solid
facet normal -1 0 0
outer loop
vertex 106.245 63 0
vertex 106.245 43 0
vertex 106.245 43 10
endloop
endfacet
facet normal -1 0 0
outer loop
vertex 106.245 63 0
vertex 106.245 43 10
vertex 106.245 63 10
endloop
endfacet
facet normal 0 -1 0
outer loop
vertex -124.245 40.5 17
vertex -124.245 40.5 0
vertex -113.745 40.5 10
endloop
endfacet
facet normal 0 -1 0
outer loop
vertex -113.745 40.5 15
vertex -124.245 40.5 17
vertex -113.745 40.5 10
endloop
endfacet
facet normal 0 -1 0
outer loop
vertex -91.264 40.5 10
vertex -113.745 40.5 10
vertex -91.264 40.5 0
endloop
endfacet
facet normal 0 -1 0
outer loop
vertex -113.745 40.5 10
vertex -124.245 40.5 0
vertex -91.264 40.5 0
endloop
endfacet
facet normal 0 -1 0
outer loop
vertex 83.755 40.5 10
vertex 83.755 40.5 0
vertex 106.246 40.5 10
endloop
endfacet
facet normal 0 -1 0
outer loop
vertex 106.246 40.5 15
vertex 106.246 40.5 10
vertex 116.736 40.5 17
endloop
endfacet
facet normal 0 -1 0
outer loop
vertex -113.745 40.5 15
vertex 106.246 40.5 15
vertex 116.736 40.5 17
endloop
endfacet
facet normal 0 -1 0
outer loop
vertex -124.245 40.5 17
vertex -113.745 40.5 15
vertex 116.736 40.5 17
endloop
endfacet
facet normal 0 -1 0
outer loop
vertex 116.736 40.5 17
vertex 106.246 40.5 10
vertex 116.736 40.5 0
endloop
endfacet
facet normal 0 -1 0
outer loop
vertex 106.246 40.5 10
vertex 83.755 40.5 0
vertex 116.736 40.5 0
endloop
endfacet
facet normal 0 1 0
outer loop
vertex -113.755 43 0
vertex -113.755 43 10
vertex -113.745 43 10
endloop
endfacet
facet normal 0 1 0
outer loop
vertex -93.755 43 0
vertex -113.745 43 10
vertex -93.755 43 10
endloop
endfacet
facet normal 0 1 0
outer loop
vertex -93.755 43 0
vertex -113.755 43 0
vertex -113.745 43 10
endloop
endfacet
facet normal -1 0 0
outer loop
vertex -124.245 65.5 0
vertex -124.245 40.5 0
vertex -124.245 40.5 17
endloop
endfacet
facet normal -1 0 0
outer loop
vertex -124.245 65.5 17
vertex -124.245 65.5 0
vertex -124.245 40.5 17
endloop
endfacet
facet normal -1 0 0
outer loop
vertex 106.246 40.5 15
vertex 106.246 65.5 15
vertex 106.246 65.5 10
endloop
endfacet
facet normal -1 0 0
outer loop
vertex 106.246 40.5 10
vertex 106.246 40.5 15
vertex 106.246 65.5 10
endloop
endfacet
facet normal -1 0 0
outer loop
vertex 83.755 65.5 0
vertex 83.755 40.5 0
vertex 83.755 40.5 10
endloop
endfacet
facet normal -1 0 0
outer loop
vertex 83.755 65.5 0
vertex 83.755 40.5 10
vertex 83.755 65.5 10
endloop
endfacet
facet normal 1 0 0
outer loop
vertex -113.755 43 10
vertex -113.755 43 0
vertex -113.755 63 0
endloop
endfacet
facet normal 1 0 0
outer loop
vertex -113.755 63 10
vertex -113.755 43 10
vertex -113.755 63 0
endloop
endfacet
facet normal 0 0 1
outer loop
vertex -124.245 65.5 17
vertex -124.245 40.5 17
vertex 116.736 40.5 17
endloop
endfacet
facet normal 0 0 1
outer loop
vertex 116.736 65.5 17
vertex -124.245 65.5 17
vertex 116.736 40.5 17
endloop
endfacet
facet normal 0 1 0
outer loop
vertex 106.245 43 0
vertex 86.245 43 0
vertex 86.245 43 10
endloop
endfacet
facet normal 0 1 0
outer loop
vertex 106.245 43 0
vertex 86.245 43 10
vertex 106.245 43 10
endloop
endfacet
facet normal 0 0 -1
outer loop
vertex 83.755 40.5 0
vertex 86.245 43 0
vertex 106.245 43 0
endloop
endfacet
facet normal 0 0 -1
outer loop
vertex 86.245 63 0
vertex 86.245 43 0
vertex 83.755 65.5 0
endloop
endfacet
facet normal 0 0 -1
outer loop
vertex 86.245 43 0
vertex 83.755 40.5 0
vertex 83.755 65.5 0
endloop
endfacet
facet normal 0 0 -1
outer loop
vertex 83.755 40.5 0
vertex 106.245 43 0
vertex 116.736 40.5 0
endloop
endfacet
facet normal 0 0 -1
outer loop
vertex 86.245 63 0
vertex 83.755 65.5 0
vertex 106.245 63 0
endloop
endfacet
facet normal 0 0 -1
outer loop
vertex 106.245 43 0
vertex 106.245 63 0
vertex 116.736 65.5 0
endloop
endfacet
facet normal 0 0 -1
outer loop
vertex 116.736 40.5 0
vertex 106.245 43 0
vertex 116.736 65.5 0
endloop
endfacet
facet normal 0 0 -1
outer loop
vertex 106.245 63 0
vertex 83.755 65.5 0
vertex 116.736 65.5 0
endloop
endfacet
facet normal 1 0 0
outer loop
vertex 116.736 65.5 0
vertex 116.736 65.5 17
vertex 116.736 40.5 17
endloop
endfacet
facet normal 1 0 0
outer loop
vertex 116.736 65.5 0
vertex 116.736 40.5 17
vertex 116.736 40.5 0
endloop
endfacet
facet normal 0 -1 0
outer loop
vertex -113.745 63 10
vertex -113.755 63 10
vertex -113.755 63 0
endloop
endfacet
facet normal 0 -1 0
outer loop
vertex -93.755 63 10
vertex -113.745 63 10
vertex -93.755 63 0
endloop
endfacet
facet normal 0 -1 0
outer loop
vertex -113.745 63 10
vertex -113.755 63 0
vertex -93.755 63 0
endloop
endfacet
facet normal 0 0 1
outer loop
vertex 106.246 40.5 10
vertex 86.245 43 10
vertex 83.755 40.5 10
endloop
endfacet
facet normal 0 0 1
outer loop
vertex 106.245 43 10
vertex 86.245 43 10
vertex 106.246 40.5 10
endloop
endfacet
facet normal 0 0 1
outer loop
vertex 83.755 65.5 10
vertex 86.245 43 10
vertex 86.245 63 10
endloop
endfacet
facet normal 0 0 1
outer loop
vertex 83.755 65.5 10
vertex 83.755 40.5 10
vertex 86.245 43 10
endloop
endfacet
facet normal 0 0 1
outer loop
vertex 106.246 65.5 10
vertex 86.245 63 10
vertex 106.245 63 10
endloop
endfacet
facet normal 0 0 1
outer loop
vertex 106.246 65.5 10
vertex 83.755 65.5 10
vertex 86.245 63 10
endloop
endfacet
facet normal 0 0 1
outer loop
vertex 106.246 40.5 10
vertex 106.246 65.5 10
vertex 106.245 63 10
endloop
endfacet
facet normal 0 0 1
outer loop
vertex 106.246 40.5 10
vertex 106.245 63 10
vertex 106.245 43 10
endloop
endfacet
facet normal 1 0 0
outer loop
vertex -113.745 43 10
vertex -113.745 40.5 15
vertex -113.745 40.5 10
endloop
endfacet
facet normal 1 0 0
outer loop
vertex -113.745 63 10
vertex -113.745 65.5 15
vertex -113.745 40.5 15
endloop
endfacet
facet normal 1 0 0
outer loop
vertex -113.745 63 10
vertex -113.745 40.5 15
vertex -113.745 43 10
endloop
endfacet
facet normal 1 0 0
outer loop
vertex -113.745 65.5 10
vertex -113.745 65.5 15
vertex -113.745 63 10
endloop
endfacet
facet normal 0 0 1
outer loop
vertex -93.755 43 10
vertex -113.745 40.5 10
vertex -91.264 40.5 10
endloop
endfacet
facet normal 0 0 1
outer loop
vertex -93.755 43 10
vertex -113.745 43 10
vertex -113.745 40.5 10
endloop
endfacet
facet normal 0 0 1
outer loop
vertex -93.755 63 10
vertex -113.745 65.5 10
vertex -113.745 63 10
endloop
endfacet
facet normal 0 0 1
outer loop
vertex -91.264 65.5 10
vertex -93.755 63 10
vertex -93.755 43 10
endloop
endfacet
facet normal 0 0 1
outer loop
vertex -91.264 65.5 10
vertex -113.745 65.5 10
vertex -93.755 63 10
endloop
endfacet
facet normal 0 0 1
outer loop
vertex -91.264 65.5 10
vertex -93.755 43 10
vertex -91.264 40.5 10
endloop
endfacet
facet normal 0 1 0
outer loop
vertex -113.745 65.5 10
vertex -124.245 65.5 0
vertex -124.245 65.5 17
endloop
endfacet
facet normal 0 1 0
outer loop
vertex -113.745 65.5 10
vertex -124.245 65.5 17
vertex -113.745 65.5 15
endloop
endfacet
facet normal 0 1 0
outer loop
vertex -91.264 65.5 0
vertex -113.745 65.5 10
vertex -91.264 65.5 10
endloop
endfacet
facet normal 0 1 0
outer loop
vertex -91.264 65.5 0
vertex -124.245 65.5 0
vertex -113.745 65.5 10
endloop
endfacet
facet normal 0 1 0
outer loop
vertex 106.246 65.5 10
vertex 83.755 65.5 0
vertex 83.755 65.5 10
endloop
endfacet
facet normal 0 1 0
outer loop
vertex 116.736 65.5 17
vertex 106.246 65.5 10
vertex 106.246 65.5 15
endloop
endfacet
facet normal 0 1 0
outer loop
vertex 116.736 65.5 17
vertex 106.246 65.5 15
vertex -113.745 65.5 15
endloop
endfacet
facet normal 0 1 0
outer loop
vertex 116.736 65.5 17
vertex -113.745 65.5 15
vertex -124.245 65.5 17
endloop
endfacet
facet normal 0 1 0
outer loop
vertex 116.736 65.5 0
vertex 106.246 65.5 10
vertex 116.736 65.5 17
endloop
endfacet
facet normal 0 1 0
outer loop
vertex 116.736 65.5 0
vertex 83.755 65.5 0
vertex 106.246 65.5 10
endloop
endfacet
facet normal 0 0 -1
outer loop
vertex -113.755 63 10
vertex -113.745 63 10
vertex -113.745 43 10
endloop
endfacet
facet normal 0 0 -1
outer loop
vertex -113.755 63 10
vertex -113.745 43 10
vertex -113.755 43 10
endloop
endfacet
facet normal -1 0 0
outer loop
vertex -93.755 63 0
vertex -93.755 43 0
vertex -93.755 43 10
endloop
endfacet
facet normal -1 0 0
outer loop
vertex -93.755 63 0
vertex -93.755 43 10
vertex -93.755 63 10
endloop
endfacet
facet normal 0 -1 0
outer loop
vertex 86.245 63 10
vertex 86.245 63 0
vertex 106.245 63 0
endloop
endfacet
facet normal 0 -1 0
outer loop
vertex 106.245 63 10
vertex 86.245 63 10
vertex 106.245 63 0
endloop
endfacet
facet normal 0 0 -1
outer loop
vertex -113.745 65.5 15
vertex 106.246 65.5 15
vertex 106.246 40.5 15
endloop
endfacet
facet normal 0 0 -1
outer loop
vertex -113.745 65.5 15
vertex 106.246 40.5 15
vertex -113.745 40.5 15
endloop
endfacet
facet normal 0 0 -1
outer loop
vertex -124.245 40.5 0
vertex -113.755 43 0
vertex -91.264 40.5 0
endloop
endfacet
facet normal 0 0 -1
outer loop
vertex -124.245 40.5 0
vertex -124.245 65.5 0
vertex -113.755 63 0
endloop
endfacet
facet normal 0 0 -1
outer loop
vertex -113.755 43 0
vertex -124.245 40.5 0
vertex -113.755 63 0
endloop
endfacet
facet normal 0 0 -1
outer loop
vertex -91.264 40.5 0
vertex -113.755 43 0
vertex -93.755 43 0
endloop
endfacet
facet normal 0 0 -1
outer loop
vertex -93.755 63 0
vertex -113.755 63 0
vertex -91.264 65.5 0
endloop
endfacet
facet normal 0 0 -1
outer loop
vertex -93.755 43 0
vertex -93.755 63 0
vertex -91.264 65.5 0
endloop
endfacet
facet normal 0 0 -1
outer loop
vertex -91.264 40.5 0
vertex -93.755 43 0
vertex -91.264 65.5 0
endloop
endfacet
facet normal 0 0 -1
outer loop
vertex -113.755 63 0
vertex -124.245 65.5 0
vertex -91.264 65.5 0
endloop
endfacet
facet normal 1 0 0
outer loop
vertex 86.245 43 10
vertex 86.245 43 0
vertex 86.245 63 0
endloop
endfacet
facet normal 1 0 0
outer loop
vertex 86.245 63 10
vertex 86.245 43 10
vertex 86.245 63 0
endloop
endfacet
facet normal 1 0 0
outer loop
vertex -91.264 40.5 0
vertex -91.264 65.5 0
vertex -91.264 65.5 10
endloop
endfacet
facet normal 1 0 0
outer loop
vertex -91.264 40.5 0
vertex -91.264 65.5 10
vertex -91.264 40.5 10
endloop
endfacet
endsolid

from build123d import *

# Parameters (mm, degrees)
ESQUISSE1_W                     = 20
ESQUISSE1_H                     = 20
BOSS_EXTRU_1_DEPTH              = 10
ESQUISSE2_W                     = 237.218260139
ESQUISSE2_H                     = 128.428413156
ENL_V_MAT_EXTRU_6_DEPTH         = 10
ENL_V_MAT_EXTRU_7_DEPTH         = 10
BOSS_EXTRU_4_START              = -2
BOSS_EXTRU_4_DEPTH              = 9
ESQUISSE10_W                    = 2
ESQUISSE10_H                    = 4
BOSS_EXTRU_5_DEPTH              = 224.980719072
ESQUISSE11_W                    = 2.5
ESQUISSE11_H                    = 5
BOSS_EXTRU_6_DEPTH              = 4
SYM_TRIE1_START                 = 8
SYM_TRIE1_OUTLINE_W             = 4
SYM_TRIE1_OUTLINE_H             = 4
SYM_TRIE1_DEPTH                 = 9
BOSS_EXTRU_9_REACH              = 128.238
BOSS_EXTRU_9_DIRECTION_2_REACH  = 128.238
BOSS_EXTRU_10_REACH             = 128.238
BOSS_EXTRU_10_DIRECTION_2_REACH = 128.238
ESQUISSE14_W                    = 8
ESQUISSE14_H                    = 8
BOSS_EXTRU_11_DEPTH             = 25


# Read off the part's stored shape, not the designer's step: Symétrie1
with BuildPart() as part:
    # Esquisse1 → Boss.-Extru.1 (new body)
    with BuildSketch(Plane.XY):
        Polygon((-116.245179768, 65.5), (-116.245179768, 40.5), (-116.189357624, -40.5), (-116.189357624, -65.5), (108.67971716, -65.5), (108.67971716, -40.5), (108.735539304, 40.5), (108.735539304, 65.5), align=None)
        Polygon((83.754820232, 40.5), (106.172004788, 40.5), (106.172004788, -40.5), (83.67971716, -40.5), (83.67971716, -63), (-91.189357624, -63), (-91.189357624, -40.5), (-113.681645253, -40.5), (-113.681645253, 40.5), (-91.264460696, 40.5), (-91.264460696, 63), (83.754820232, 63), align=None, mode=Mode.SUBTRACT)
        Polygon((-113.66622051, -63.007706414), (-113.681645253, -43.007712371), (-93.681645253, -43.023131157), (-93.697069995, -62.992287629), align=None, mode=Mode.SUBTRACT)
        Polygon((106.172004788, -43.007712371), (106.156580046, -63.007706414), (86.187429531, -62.992287629), (86.172004788, -43.023131157), align=None, mode=Mode.SUBTRACT)
        with Locations((-103.754820232, 53)):
            Rectangle(ESQUISSE1_W, ESQUISSE1_H, mode=Mode.SUBTRACT)
        with Locations((96.245179768, 53)):
            Rectangle(ESQUISSE1_W, ESQUISSE1_H, mode=Mode.SUBTRACT)
    extrude(amount=BOSS_EXTRU_1_DEPTH)

    # Esquisse2 → Enlèv. mat.-Extru.6 (cut)
    with BuildSketch(Plane(origin=(0, 0, 0), x_dir=(-1, 0, 0), z_dir=(0, 0, -1))):
        with Locations((9.873590765, -23.714206578)):
            Rectangle(ESQUISSE2_W, ESQUISSE2_H)
    extrude(amount=-ENL_V_MAT_EXTRU_6_DEPTH, mode=Mode.SUBTRACT)

    # Esquisse4 → Enlèv. mat.-Extru.7 (cut)
    with BuildSketch(Plane(origin=(0, 0, 0), x_dir=(-1, 0, 0), z_dir=(0, 0, -1))):
        Polygon((-83.754820232, 63), (-83.754820232, 68.626436571), (91.264460696, 65.5), (91.264460696, 63), align=None)
    extrude(amount=-ENL_V_MAT_EXTRU_7_DEPTH, mode=Mode.SUBTRACT)


with BuildPart() as enl_v_mat_extru_7_piece_1:
    # of the separate pieces the step leaves, piece 1, a body of its own (enl_v_mat_extru_7_pieces)
    add(part.part.solids().sort_by_distance((-116.245179768, 65.5, 0))[0])

    # Esquisse9 → Boss.-Extru.4 (add)
    with BuildSketch(Plane.XY.offset(10).offset(BOSS_EXTRU_4_START)):
        Polygon((-116.245179768, 53), (-116.245179768, 55), (-120.245179768, 55), (-120.245179768, 51), (-116.245179768, 51), align=None)
    extrude(amount=BOSS_EXTRU_4_DEPTH)

    # Esquisse10 → Boss.-Extru.5 (add)
    with BuildSketch(Plane(origin=(-116.245179768, 0, 0), x_dir=(0, 0, -1), z_dir=(1, 0, 0))):
        with Locations((-16, 53)):
            Rectangle(ESQUISSE10_W, ESQUISSE10_H)
    extrude(amount=BOSS_EXTRU_5_DEPTH)

    # Esquisse11 → Boss.-Extru.6 (add)
    with BuildSketch(Plane.XZ.offset(-51)):
        with Locations((-114.995179768, 12.5)):
            Rectangle(ESQUISSE11_W, ESQUISSE11_H)
    extrude(amount=-BOSS_EXTRU_6_DEPTH)

    # Symétrie1 outline → Symétrie1 (add)
    with BuildSketch(Plane.XY.offset(SYM_TRIE1_START)):
        with Locations((-122.245179768, 53)):
            Rectangle(SYM_TRIE1_OUTLINE_W, SYM_TRIE1_OUTLINE_H)
    extrude(amount=SYM_TRIE1_DEPTH)


with BuildPart() as enl_v_mat_extru_7_piece_2:
    # of the separate pieces the step leaves, piece 2, a body of its own (enl_v_mat_extru_7_pieces)
    add(part.part.solids().sort_by_distance((108.735539304, 65.5, 0))[0])

    # Boss.-Extru.9: up to this face of the body (flat: up to its plane)
    boss_extru_9_end = Plane(enl_v_mat_extru_7_piece_2.part.faces().sort_by_distance((96.245179768, 65.5, 5))[0])
    # Esquisse12 → Boss.-Extru.9 (add, up to the picked face)
    with BuildSketch(Plane(origin=(0, 55, 0), x_dir=(1, 0, 0), z_dir=(0, 1, 0)), mode=Mode.PRIVATE) as boss_extru_9_sk1:
        Polygon((108.735539304, -10), (108.735539304, -8), (116.735539304, -8), (116.735539304, -17), (108.735539304, -17), (108.735539304, -15), (106.245539304, -15), (106.245539304, -10), align=None)
    boss_extru_9_tool1 = split(extrude(boss_extru_9_sk1.sketch, amount=BOSS_EXTRU_9_REACH, mode=Mode.PRIVATE), bisect_by=boss_extru_9_end, keep=Keep.BOTH, mode=Mode.PRIVATE)

    add(enl_v_mat_extru_7_piece_1.part)  # Boss.-Extru.9 merges Enlèv. mat.-Extru.7 piece 1
    add(boss_extru_9_tool1.solids().sort_by(Axis((111.962298, 55, 12.5), (0, 1, 0)))[0])

    # Boss.-Extru.9 direction 2: up to this face of the body (flat: up to its plane)
    boss_extru_9_direction_2_end = Plane(enl_v_mat_extru_7_piece_2.part.faces().sort_by_distance((96.245179768, 40.5, 5))[0])
    # Esquisse12 → Boss.-Extru.9 direction 2 (add, up to the picked face)
    with BuildSketch(Plane(origin=(0, 55, 0), x_dir=(1, 0, 0), z_dir=(0, 1, 0)), mode=Mode.PRIVATE) as boss_extru_9_direction_2_sk1:
        Polygon((108.735539304, -10), (108.735539304, -8), (116.735539304, -8), (116.735539304, -17), (108.735539304, -17), (108.735539304, -15), (106.245539304, -15), (106.245539304, -10), align=None)
    boss_extru_9_direction_2_tool1 = split(extrude(boss_extru_9_direction_2_sk1.sketch, amount=-BOSS_EXTRU_9_DIRECTION_2_REACH, mode=Mode.PRIVATE), bisect_by=boss_extru_9_direction_2_end, keep=Keep.BOTH, mode=Mode.PRIVATE)
    add(boss_extru_9_direction_2_tool1.solids().sort_by(Axis((111.962298, 55, 12.5), (0, -1, 0)))[0])

    # Boss.-Extru.10: up to this face of the body (flat: up to its plane)
    boss_extru_10_end = Plane(enl_v_mat_extru_7_piece_2.part.faces().sort_by_distance((100.216105898, 65.5, 6.894873222))[0])
    # Esquisse13 → Boss.-Extru.10 (add, up to the picked face)
    with BuildSketch(Plane(origin=(0, 55, 0), x_dir=(1, 0, 0), z_dir=(0, 1, 0)), mode=Mode.PRIVATE) as boss_extru_10_sk1:
        Polygon((-124.245179768, -17), (108.735539304, -17), (108.735539304, -15), (-113.745179768, -15), (-113.745179768, -10), (-116.245179768, -10), (-116.245179768, -8), (-124.245179768, -8), align=None)
    boss_extru_10_tool1 = split(extrude(boss_extru_10_sk1.sketch, amount=BOSS_EXTRU_10_REACH, mode=Mode.PRIVATE), bisect_by=boss_extru_10_end, keep=Keep.BOTH, mode=Mode.PRIVATE)
    add(boss_extru_10_tool1.solids().sort_by(Axis((-22.049518, 55, 15.446639), (0, 1, 0)))[0])

    # Boss.-Extru.10 direction 2: up to this face of the body (flat: up to its plane)
    boss_extru_10_direction_2_end = Plane(enl_v_mat_extru_7_piece_2.part.faces().sort_by_distance((-103.754820232, 40.5, 5))[0])
    # Esquisse13 → Boss.-Extru.10 direction 2 (add, up to the picked face)
    with BuildSketch(Plane(origin=(0, 55, 0), x_dir=(1, 0, 0), z_dir=(0, 1, 0)), mode=Mode.PRIVATE) as boss_extru_10_direction_2_sk1:
        Polygon((-124.245179768, -17), (108.735539304, -17), (108.735539304, -15), (-113.745179768, -15), (-113.745179768, -10), (-116.245179768, -10), (-116.245179768, -8), (-124.245179768, -8), align=None)
    boss_extru_10_direction_2_tool1 = split(extrude(boss_extru_10_direction_2_sk1.sketch, amount=-BOSS_EXTRU_10_DIRECTION_2_REACH, mode=Mode.PRIVATE), bisect_by=boss_extru_10_direction_2_end, keep=Keep.BOTH, mode=Mode.PRIVATE)
    add(boss_extru_10_direction_2_tool1.solids().sort_by(Axis((-22.049518, 55, 15.446639), (0, -1, 0)))[0])

    # Esquisse14 → Boss.-Extru.11 (add)
    with BuildSketch(Plane(origin=(0, 65.5, 0), x_dir=(1, 0, 0), z_dir=(0, 1, 0))):
        with Locations((112.735539304, -4)):
            Rectangle(ESQUISSE14_W, ESQUISSE14_H)
        with Locations((-120.245179768, -4)):
            Rectangle(ESQUISSE14_W, ESQUISSE14_H)
    extrude(amount=-BOSS_EXTRU_11_DEPTH)


solid = enl_v_mat_extru_7_piece_2.part
